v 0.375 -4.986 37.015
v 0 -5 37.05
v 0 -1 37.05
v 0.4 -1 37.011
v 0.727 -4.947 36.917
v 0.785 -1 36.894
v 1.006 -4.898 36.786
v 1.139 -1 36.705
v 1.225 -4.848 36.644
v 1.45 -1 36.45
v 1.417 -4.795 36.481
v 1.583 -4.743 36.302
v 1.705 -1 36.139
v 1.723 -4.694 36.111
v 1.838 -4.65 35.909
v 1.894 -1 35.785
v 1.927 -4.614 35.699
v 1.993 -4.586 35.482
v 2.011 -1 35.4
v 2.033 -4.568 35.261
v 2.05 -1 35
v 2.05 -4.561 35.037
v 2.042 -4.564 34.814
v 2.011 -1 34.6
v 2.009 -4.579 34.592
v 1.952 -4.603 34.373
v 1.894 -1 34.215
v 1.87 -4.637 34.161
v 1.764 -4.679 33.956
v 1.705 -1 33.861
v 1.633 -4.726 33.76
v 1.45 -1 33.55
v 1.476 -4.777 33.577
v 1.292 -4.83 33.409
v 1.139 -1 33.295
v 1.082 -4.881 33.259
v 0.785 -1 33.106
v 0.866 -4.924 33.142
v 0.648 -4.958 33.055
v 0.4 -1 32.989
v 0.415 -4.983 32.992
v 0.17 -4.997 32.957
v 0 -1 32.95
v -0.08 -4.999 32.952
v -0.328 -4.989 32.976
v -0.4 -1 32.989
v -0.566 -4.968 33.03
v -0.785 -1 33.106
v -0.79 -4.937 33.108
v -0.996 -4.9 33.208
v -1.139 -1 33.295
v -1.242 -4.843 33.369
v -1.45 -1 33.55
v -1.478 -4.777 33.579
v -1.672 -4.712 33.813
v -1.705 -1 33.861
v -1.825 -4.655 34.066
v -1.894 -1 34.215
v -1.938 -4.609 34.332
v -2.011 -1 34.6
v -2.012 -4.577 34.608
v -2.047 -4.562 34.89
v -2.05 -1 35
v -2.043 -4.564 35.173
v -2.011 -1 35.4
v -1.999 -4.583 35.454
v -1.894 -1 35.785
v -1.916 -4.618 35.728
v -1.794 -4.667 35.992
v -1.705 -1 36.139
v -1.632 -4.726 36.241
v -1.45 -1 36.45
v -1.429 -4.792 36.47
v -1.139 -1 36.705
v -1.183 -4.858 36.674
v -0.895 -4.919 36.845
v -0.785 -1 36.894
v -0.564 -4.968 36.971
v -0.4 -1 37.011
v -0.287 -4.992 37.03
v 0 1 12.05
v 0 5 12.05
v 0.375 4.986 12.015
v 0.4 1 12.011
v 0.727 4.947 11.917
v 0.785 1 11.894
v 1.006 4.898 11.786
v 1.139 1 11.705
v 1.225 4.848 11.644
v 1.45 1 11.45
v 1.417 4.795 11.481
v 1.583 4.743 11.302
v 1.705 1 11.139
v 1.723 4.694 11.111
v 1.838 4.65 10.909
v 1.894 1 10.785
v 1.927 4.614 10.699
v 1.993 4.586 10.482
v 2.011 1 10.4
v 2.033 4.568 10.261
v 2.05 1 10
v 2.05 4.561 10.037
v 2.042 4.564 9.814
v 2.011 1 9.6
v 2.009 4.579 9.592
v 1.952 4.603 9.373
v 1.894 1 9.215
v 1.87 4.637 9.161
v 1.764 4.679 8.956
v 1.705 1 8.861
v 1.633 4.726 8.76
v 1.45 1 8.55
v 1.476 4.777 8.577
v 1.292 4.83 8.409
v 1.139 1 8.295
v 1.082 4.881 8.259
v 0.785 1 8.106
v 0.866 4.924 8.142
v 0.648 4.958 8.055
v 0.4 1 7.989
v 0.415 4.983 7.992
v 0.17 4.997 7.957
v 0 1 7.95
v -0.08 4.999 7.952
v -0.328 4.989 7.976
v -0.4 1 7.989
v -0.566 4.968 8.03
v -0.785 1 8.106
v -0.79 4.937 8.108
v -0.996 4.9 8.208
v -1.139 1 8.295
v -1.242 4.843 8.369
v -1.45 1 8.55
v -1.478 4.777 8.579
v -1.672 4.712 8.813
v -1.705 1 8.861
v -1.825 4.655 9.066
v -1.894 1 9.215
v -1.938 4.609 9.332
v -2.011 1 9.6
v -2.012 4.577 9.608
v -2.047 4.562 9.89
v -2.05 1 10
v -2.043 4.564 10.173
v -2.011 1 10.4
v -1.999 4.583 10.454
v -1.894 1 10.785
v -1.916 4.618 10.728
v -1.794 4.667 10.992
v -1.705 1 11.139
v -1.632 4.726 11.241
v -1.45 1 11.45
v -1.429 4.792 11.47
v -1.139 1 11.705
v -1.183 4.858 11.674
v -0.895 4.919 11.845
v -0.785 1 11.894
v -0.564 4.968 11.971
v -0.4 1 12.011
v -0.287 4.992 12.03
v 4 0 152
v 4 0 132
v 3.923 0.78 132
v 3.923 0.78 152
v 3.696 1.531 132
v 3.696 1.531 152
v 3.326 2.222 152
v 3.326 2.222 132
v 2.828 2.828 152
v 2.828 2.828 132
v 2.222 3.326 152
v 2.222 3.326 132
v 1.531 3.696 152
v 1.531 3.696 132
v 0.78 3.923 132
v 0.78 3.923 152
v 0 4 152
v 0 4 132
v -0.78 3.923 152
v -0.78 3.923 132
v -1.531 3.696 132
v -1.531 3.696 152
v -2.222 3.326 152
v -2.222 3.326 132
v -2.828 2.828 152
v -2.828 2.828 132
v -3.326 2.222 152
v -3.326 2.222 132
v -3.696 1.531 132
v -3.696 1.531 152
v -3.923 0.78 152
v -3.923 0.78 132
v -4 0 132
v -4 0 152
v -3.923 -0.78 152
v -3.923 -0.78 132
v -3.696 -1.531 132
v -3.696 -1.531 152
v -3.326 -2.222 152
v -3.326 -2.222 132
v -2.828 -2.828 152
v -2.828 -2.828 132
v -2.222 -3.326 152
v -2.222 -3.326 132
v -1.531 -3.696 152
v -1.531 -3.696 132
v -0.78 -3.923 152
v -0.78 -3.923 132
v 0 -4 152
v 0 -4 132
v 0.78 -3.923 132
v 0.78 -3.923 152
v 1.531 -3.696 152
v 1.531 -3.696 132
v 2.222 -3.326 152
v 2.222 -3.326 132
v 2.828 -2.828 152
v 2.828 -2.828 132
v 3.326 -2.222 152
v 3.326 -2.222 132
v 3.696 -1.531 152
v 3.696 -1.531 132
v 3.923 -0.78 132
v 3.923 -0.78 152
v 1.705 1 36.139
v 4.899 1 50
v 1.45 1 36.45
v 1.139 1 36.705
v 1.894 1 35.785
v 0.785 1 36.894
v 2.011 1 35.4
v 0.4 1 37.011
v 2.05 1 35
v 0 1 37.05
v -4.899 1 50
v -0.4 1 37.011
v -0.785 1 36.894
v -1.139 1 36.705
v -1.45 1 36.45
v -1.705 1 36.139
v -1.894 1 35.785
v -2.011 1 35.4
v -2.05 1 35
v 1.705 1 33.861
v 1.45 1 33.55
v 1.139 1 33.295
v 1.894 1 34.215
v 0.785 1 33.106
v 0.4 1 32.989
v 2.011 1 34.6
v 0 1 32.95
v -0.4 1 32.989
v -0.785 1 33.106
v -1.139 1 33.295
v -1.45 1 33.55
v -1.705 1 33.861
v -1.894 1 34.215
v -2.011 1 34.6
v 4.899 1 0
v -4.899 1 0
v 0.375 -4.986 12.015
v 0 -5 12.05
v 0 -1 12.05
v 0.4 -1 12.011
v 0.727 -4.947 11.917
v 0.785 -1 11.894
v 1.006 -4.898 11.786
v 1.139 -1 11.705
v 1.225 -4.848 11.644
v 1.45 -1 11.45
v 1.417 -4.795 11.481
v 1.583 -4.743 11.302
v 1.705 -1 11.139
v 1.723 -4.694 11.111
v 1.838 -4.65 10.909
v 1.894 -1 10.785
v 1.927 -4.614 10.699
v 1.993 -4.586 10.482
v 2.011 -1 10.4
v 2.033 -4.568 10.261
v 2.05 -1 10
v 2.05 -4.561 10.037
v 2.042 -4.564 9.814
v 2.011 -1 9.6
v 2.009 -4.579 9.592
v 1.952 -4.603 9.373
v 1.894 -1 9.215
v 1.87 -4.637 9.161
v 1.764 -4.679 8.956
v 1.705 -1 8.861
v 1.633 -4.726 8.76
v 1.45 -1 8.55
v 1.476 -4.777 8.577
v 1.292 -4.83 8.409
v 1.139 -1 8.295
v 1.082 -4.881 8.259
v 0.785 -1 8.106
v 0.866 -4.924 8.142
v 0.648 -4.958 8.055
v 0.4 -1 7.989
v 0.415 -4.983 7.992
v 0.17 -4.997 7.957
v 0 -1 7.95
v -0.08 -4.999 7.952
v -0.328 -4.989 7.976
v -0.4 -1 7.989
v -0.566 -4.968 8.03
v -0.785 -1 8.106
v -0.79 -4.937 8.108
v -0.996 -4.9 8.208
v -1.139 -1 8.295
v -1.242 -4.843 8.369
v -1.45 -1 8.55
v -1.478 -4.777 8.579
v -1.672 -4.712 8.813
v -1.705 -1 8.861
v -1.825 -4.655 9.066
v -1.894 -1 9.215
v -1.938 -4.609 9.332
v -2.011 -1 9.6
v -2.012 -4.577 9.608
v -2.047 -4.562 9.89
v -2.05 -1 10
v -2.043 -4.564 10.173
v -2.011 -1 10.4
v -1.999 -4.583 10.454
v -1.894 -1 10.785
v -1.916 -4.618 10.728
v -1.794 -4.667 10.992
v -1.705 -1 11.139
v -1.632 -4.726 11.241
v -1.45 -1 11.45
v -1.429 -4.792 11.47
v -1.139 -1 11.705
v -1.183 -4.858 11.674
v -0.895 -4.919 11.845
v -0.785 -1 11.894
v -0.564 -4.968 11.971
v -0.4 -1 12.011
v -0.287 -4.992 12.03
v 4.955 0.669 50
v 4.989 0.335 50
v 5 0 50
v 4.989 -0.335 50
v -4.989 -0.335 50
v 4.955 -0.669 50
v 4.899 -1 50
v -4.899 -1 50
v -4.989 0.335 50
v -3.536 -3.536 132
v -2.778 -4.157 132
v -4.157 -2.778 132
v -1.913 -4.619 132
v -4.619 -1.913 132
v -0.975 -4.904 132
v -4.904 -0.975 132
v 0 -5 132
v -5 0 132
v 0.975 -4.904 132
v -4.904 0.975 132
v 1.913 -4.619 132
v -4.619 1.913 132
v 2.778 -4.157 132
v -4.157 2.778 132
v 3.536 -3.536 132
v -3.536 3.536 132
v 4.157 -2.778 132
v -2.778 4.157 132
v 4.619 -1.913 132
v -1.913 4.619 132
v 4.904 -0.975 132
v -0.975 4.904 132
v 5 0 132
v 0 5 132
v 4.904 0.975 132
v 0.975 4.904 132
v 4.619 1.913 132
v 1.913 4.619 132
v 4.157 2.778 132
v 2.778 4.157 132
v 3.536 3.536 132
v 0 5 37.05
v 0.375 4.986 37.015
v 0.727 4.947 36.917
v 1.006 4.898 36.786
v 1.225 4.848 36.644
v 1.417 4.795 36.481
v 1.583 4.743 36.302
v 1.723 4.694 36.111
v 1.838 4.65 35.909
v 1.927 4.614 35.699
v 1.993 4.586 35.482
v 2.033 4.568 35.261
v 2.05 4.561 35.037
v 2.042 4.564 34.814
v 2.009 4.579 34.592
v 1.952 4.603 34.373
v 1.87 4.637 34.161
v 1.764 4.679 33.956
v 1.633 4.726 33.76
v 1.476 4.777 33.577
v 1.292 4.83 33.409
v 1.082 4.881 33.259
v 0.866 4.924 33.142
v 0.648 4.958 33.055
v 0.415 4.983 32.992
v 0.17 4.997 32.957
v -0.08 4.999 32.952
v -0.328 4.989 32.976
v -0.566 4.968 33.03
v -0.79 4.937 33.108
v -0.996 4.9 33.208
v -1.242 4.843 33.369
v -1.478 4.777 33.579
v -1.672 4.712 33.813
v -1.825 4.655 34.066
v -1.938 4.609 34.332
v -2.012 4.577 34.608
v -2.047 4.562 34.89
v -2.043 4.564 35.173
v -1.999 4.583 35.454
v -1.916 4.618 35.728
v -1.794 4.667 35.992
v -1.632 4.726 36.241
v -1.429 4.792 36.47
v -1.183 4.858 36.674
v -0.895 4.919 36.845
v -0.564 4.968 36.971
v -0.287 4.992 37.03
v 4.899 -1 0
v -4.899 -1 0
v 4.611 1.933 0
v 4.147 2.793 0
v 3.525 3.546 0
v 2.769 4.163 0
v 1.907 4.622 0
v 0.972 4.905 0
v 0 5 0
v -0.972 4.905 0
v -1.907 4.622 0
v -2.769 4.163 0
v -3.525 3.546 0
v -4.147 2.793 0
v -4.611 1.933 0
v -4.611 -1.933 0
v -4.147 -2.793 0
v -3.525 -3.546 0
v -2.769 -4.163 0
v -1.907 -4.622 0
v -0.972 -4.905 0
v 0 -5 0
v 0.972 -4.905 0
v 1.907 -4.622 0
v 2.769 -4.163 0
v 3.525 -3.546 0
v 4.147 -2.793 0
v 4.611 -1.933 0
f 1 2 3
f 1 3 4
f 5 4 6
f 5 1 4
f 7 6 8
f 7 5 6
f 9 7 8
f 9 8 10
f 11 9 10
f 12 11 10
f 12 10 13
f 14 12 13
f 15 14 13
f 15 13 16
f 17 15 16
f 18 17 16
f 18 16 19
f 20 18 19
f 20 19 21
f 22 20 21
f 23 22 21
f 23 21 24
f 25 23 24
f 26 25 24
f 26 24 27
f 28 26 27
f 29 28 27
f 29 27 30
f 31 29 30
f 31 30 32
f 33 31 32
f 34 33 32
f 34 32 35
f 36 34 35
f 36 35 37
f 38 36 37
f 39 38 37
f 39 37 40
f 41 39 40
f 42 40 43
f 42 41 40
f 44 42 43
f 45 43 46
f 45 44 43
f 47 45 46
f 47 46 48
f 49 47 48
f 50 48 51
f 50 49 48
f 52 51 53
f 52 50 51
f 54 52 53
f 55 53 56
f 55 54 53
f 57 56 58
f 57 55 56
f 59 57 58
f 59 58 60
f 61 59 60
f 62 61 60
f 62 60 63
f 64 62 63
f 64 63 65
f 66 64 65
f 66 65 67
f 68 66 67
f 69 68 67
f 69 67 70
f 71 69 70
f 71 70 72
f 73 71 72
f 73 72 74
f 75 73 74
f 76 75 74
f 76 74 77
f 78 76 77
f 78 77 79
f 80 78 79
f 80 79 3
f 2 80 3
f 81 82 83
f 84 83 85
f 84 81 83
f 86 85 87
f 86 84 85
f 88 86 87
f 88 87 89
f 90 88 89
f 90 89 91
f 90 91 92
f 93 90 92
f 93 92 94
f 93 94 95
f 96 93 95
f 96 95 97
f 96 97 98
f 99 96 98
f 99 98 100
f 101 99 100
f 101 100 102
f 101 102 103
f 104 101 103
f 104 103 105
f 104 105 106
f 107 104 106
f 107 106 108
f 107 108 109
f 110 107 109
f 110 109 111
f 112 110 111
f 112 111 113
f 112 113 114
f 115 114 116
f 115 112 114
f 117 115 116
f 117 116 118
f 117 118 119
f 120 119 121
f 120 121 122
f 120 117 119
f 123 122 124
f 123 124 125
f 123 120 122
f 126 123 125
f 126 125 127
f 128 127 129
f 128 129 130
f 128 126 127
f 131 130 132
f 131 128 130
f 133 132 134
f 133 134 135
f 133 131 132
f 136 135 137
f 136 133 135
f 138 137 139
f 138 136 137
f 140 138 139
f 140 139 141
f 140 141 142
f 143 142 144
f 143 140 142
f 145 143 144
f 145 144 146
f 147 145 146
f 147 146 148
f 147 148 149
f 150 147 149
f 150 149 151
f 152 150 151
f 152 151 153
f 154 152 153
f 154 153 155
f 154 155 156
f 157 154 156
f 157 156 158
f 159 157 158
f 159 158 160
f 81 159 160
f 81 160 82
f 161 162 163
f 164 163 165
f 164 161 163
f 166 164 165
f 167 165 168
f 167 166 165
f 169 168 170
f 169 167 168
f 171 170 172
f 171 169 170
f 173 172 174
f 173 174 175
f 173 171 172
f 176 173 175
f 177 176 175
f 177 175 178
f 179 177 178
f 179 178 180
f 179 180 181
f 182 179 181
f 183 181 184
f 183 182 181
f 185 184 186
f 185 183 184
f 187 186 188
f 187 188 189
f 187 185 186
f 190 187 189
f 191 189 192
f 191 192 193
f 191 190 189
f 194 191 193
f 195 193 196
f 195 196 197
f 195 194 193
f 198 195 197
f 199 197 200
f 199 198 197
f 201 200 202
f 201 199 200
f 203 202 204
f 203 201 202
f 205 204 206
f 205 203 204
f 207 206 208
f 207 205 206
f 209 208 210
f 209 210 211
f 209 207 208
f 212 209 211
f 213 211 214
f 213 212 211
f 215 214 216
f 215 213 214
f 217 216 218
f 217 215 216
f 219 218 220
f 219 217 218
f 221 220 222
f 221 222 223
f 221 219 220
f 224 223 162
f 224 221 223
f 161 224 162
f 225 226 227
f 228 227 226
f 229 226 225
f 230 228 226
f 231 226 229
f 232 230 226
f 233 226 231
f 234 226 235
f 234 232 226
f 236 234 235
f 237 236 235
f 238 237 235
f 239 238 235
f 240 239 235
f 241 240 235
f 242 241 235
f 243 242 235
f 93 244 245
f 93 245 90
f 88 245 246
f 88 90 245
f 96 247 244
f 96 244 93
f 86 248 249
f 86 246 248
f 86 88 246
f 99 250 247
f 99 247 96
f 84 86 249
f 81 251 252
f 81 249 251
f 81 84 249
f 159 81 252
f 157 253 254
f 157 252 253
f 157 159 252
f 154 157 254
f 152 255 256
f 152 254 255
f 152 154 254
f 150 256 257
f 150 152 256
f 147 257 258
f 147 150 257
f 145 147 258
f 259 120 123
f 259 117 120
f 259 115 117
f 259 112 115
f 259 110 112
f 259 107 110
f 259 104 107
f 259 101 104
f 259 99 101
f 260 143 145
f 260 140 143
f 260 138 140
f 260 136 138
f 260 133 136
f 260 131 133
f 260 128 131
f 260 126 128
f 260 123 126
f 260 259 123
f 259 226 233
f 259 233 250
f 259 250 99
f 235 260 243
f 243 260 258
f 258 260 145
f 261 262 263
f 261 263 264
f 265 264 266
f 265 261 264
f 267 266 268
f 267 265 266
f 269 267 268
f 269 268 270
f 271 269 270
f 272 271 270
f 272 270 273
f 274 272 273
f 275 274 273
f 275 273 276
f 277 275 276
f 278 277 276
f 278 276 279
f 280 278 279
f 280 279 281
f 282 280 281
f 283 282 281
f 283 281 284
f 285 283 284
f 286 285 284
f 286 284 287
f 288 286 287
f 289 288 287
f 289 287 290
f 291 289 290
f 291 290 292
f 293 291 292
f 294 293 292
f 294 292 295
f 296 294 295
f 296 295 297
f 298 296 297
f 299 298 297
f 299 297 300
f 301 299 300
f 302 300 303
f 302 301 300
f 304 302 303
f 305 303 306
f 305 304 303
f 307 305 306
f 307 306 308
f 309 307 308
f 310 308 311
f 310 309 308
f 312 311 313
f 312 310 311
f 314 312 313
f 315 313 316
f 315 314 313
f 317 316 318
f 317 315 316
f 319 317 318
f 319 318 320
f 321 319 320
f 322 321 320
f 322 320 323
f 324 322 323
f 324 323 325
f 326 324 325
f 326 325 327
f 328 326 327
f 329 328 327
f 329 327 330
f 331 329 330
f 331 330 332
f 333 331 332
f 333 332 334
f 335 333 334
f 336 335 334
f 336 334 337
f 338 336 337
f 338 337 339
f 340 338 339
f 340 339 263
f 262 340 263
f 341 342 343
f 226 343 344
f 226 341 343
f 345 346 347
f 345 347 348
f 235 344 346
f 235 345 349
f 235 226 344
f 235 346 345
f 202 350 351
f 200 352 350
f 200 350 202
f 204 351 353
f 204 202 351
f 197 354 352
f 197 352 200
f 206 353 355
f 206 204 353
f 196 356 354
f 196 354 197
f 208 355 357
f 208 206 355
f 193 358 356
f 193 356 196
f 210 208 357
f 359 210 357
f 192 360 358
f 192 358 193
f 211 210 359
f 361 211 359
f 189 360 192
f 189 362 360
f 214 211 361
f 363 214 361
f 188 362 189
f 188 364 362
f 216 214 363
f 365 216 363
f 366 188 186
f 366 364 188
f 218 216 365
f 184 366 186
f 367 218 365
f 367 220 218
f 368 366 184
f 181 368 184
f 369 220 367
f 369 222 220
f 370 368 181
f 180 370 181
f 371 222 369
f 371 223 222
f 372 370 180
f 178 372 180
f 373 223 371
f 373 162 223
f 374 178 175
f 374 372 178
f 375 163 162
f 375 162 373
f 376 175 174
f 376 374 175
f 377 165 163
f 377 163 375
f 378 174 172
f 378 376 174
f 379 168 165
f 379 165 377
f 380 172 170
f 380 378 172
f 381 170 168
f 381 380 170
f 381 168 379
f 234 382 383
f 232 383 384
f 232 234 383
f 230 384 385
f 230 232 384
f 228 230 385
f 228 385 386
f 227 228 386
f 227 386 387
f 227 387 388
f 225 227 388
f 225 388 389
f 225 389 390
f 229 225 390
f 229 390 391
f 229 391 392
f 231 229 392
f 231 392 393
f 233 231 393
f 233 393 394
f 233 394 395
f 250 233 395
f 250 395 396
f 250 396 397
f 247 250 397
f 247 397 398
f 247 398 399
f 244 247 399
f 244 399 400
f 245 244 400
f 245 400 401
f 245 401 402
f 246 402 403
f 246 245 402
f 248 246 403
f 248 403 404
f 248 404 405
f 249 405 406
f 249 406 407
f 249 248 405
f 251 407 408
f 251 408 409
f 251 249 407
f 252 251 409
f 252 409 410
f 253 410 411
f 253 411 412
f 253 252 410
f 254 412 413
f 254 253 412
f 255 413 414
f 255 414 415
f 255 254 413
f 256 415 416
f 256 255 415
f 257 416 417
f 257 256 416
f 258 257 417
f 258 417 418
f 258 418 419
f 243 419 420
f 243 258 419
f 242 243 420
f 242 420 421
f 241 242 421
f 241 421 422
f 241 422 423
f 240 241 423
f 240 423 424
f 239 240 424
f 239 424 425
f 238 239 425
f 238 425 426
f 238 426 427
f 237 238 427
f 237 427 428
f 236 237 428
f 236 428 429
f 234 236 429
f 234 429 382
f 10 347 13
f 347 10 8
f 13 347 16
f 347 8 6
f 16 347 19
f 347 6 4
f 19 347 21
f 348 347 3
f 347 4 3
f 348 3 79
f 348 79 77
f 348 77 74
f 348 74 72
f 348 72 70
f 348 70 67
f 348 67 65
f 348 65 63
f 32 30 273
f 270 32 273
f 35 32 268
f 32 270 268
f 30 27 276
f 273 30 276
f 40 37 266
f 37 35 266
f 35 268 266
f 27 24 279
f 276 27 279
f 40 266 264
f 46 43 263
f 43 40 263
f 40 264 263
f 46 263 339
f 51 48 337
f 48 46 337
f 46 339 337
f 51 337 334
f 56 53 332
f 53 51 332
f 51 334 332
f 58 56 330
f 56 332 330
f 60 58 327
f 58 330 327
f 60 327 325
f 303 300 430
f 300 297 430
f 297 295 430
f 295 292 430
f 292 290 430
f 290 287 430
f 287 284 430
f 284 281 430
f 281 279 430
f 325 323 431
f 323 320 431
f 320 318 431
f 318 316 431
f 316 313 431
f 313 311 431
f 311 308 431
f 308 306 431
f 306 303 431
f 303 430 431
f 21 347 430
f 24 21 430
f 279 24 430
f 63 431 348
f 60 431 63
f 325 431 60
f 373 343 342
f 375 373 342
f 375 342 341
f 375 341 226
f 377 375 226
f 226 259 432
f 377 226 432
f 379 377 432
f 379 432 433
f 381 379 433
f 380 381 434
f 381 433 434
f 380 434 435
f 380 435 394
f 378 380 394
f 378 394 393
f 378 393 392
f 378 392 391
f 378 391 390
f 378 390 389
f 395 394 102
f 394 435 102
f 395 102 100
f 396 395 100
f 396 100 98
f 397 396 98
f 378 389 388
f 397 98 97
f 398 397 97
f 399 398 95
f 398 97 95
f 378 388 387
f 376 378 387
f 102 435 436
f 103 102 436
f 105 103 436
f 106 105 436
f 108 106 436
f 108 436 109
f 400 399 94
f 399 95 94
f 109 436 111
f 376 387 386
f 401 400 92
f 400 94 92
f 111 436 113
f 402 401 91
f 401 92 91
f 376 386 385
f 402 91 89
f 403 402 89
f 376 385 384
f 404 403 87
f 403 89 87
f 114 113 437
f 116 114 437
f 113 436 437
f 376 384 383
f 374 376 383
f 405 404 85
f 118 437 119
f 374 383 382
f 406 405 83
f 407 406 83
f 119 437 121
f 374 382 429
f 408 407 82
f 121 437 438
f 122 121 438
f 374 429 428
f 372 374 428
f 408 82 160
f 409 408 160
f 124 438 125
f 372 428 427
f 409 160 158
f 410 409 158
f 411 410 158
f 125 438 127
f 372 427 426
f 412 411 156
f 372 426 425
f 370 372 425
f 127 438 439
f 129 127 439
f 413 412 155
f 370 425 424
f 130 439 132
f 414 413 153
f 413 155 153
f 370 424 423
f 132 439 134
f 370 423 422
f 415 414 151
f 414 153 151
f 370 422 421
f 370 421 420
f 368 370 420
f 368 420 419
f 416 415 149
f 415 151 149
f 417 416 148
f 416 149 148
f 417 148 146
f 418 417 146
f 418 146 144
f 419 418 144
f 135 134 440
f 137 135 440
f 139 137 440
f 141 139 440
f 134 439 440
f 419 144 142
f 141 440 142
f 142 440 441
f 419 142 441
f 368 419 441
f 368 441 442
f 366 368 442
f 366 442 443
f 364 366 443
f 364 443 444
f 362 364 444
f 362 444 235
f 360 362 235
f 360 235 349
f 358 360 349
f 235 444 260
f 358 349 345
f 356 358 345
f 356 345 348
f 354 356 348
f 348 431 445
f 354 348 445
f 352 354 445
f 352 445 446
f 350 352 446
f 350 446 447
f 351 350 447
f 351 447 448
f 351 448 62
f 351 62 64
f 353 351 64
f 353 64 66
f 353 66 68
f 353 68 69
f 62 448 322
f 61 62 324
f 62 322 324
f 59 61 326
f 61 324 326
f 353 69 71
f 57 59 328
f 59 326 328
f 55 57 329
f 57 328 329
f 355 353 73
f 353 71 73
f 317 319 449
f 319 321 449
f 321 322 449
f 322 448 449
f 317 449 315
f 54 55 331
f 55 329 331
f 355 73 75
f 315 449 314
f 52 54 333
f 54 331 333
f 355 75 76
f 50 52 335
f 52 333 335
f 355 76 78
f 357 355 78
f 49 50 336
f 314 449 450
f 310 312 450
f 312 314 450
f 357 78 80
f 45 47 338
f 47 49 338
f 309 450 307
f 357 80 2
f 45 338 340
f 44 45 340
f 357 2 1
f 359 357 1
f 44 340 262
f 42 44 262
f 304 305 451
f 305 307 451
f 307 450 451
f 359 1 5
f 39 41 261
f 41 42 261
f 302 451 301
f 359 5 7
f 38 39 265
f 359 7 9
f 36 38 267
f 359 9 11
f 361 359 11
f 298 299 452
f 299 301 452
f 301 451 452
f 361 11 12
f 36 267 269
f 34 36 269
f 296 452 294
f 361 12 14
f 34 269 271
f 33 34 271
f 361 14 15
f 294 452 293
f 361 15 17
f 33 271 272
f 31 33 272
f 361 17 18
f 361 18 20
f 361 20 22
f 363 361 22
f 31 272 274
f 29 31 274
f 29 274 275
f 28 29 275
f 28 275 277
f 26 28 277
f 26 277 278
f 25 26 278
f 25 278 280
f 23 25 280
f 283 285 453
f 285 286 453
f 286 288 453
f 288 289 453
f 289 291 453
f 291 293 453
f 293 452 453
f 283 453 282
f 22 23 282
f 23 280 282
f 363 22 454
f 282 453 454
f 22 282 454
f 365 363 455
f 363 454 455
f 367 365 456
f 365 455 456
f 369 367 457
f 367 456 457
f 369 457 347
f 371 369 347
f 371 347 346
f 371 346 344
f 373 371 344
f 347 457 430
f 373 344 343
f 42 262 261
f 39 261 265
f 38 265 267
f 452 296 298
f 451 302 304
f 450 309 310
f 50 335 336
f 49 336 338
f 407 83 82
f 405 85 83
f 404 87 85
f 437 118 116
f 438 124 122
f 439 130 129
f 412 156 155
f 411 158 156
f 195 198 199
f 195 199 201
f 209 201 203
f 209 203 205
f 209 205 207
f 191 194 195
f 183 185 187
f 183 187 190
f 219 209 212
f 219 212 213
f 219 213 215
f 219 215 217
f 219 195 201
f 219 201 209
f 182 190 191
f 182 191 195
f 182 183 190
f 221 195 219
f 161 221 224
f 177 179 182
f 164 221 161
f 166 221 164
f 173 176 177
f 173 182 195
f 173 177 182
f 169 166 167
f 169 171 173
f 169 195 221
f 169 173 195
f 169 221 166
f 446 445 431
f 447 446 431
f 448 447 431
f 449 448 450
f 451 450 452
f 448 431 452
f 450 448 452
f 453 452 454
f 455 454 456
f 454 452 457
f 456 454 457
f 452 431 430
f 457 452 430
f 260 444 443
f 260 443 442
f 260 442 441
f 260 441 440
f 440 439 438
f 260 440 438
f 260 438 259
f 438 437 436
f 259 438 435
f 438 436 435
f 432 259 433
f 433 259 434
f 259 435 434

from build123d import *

# Parameters (mm, degrees)
SKETCH1_R               = 5
BOSS_EXTRUDE1_DEPTH     = 152
CUT_EXTRUDE2_DEPTH      = 153.164384795
CUT_EXTRUDE2_DEPTH_BACK = 153.164384795
SKETCH3_R               = 2.05
SKETCH5_W               = 15
SKETCH5_H               = 2
CUT_EXTRUDE4_DEPTH      = 50
SKETCH6_OUTSIDE_W       = 42.532
SKETCH6_OUTSIDE_H       = 42.532
SKETCH6_OUTSIDE_R       = 4
CUT_EXTRUDE5_DEPTH      = 20


with BuildPart() as part:
    # Sketch1 → Boss-Extrude1 (new body)
    with BuildSketch(Plane.XY):
        Circle(SKETCH1_R)
    extrude(amount=BOSS_EXTRUDE1_DEPTH)

    # Sketch3 → Cut-Extrude2 (cut, two sides: drawn at the far end of the back side and taken through both)
    with BuildSketch(Plane(origin=(0, 0, 0), x_dir=(1, 0, 0), z_dir=(0, 1, 0)).offset(-CUT_EXTRUDE2_DEPTH_BACK)):
        with Locations(Location((0, -10, 0), (0, 0, 270))):
            Circle(SKETCH3_R)
        with Locations(Location((0, -35, 0), (0, 0, 270))):
            Circle(SKETCH3_R)
    extrude(amount=CUT_EXTRUDE2_DEPTH + CUT_EXTRUDE2_DEPTH_BACK, mode=Mode.SUBTRACT)

    # Sketch5 → Cut-Extrude4 (cut)
    with BuildSketch(Plane(origin=(0, 0, 0), x_dir=(-1, 0, 0), z_dir=(0, 0, -1))):
        Rectangle(SKETCH5_W, SKETCH5_H)
    extrude(amount=-CUT_EXTRUDE4_DEPTH, mode=Mode.SUBTRACT)

    # Sketch6 outside → Cut-Extrude5 (cut)
    with BuildSketch(Plane.XY.offset(152)):
        Rectangle(SKETCH6_OUTSIDE_W, SKETCH6_OUTSIDE_H)
        Circle(SKETCH6_OUTSIDE_R, mode=Mode.SUBTRACT)
    extrude(amount=-CUT_EXTRUDE5_DEPTH, mode=Mode.SUBTRACT)


solid = part.part
